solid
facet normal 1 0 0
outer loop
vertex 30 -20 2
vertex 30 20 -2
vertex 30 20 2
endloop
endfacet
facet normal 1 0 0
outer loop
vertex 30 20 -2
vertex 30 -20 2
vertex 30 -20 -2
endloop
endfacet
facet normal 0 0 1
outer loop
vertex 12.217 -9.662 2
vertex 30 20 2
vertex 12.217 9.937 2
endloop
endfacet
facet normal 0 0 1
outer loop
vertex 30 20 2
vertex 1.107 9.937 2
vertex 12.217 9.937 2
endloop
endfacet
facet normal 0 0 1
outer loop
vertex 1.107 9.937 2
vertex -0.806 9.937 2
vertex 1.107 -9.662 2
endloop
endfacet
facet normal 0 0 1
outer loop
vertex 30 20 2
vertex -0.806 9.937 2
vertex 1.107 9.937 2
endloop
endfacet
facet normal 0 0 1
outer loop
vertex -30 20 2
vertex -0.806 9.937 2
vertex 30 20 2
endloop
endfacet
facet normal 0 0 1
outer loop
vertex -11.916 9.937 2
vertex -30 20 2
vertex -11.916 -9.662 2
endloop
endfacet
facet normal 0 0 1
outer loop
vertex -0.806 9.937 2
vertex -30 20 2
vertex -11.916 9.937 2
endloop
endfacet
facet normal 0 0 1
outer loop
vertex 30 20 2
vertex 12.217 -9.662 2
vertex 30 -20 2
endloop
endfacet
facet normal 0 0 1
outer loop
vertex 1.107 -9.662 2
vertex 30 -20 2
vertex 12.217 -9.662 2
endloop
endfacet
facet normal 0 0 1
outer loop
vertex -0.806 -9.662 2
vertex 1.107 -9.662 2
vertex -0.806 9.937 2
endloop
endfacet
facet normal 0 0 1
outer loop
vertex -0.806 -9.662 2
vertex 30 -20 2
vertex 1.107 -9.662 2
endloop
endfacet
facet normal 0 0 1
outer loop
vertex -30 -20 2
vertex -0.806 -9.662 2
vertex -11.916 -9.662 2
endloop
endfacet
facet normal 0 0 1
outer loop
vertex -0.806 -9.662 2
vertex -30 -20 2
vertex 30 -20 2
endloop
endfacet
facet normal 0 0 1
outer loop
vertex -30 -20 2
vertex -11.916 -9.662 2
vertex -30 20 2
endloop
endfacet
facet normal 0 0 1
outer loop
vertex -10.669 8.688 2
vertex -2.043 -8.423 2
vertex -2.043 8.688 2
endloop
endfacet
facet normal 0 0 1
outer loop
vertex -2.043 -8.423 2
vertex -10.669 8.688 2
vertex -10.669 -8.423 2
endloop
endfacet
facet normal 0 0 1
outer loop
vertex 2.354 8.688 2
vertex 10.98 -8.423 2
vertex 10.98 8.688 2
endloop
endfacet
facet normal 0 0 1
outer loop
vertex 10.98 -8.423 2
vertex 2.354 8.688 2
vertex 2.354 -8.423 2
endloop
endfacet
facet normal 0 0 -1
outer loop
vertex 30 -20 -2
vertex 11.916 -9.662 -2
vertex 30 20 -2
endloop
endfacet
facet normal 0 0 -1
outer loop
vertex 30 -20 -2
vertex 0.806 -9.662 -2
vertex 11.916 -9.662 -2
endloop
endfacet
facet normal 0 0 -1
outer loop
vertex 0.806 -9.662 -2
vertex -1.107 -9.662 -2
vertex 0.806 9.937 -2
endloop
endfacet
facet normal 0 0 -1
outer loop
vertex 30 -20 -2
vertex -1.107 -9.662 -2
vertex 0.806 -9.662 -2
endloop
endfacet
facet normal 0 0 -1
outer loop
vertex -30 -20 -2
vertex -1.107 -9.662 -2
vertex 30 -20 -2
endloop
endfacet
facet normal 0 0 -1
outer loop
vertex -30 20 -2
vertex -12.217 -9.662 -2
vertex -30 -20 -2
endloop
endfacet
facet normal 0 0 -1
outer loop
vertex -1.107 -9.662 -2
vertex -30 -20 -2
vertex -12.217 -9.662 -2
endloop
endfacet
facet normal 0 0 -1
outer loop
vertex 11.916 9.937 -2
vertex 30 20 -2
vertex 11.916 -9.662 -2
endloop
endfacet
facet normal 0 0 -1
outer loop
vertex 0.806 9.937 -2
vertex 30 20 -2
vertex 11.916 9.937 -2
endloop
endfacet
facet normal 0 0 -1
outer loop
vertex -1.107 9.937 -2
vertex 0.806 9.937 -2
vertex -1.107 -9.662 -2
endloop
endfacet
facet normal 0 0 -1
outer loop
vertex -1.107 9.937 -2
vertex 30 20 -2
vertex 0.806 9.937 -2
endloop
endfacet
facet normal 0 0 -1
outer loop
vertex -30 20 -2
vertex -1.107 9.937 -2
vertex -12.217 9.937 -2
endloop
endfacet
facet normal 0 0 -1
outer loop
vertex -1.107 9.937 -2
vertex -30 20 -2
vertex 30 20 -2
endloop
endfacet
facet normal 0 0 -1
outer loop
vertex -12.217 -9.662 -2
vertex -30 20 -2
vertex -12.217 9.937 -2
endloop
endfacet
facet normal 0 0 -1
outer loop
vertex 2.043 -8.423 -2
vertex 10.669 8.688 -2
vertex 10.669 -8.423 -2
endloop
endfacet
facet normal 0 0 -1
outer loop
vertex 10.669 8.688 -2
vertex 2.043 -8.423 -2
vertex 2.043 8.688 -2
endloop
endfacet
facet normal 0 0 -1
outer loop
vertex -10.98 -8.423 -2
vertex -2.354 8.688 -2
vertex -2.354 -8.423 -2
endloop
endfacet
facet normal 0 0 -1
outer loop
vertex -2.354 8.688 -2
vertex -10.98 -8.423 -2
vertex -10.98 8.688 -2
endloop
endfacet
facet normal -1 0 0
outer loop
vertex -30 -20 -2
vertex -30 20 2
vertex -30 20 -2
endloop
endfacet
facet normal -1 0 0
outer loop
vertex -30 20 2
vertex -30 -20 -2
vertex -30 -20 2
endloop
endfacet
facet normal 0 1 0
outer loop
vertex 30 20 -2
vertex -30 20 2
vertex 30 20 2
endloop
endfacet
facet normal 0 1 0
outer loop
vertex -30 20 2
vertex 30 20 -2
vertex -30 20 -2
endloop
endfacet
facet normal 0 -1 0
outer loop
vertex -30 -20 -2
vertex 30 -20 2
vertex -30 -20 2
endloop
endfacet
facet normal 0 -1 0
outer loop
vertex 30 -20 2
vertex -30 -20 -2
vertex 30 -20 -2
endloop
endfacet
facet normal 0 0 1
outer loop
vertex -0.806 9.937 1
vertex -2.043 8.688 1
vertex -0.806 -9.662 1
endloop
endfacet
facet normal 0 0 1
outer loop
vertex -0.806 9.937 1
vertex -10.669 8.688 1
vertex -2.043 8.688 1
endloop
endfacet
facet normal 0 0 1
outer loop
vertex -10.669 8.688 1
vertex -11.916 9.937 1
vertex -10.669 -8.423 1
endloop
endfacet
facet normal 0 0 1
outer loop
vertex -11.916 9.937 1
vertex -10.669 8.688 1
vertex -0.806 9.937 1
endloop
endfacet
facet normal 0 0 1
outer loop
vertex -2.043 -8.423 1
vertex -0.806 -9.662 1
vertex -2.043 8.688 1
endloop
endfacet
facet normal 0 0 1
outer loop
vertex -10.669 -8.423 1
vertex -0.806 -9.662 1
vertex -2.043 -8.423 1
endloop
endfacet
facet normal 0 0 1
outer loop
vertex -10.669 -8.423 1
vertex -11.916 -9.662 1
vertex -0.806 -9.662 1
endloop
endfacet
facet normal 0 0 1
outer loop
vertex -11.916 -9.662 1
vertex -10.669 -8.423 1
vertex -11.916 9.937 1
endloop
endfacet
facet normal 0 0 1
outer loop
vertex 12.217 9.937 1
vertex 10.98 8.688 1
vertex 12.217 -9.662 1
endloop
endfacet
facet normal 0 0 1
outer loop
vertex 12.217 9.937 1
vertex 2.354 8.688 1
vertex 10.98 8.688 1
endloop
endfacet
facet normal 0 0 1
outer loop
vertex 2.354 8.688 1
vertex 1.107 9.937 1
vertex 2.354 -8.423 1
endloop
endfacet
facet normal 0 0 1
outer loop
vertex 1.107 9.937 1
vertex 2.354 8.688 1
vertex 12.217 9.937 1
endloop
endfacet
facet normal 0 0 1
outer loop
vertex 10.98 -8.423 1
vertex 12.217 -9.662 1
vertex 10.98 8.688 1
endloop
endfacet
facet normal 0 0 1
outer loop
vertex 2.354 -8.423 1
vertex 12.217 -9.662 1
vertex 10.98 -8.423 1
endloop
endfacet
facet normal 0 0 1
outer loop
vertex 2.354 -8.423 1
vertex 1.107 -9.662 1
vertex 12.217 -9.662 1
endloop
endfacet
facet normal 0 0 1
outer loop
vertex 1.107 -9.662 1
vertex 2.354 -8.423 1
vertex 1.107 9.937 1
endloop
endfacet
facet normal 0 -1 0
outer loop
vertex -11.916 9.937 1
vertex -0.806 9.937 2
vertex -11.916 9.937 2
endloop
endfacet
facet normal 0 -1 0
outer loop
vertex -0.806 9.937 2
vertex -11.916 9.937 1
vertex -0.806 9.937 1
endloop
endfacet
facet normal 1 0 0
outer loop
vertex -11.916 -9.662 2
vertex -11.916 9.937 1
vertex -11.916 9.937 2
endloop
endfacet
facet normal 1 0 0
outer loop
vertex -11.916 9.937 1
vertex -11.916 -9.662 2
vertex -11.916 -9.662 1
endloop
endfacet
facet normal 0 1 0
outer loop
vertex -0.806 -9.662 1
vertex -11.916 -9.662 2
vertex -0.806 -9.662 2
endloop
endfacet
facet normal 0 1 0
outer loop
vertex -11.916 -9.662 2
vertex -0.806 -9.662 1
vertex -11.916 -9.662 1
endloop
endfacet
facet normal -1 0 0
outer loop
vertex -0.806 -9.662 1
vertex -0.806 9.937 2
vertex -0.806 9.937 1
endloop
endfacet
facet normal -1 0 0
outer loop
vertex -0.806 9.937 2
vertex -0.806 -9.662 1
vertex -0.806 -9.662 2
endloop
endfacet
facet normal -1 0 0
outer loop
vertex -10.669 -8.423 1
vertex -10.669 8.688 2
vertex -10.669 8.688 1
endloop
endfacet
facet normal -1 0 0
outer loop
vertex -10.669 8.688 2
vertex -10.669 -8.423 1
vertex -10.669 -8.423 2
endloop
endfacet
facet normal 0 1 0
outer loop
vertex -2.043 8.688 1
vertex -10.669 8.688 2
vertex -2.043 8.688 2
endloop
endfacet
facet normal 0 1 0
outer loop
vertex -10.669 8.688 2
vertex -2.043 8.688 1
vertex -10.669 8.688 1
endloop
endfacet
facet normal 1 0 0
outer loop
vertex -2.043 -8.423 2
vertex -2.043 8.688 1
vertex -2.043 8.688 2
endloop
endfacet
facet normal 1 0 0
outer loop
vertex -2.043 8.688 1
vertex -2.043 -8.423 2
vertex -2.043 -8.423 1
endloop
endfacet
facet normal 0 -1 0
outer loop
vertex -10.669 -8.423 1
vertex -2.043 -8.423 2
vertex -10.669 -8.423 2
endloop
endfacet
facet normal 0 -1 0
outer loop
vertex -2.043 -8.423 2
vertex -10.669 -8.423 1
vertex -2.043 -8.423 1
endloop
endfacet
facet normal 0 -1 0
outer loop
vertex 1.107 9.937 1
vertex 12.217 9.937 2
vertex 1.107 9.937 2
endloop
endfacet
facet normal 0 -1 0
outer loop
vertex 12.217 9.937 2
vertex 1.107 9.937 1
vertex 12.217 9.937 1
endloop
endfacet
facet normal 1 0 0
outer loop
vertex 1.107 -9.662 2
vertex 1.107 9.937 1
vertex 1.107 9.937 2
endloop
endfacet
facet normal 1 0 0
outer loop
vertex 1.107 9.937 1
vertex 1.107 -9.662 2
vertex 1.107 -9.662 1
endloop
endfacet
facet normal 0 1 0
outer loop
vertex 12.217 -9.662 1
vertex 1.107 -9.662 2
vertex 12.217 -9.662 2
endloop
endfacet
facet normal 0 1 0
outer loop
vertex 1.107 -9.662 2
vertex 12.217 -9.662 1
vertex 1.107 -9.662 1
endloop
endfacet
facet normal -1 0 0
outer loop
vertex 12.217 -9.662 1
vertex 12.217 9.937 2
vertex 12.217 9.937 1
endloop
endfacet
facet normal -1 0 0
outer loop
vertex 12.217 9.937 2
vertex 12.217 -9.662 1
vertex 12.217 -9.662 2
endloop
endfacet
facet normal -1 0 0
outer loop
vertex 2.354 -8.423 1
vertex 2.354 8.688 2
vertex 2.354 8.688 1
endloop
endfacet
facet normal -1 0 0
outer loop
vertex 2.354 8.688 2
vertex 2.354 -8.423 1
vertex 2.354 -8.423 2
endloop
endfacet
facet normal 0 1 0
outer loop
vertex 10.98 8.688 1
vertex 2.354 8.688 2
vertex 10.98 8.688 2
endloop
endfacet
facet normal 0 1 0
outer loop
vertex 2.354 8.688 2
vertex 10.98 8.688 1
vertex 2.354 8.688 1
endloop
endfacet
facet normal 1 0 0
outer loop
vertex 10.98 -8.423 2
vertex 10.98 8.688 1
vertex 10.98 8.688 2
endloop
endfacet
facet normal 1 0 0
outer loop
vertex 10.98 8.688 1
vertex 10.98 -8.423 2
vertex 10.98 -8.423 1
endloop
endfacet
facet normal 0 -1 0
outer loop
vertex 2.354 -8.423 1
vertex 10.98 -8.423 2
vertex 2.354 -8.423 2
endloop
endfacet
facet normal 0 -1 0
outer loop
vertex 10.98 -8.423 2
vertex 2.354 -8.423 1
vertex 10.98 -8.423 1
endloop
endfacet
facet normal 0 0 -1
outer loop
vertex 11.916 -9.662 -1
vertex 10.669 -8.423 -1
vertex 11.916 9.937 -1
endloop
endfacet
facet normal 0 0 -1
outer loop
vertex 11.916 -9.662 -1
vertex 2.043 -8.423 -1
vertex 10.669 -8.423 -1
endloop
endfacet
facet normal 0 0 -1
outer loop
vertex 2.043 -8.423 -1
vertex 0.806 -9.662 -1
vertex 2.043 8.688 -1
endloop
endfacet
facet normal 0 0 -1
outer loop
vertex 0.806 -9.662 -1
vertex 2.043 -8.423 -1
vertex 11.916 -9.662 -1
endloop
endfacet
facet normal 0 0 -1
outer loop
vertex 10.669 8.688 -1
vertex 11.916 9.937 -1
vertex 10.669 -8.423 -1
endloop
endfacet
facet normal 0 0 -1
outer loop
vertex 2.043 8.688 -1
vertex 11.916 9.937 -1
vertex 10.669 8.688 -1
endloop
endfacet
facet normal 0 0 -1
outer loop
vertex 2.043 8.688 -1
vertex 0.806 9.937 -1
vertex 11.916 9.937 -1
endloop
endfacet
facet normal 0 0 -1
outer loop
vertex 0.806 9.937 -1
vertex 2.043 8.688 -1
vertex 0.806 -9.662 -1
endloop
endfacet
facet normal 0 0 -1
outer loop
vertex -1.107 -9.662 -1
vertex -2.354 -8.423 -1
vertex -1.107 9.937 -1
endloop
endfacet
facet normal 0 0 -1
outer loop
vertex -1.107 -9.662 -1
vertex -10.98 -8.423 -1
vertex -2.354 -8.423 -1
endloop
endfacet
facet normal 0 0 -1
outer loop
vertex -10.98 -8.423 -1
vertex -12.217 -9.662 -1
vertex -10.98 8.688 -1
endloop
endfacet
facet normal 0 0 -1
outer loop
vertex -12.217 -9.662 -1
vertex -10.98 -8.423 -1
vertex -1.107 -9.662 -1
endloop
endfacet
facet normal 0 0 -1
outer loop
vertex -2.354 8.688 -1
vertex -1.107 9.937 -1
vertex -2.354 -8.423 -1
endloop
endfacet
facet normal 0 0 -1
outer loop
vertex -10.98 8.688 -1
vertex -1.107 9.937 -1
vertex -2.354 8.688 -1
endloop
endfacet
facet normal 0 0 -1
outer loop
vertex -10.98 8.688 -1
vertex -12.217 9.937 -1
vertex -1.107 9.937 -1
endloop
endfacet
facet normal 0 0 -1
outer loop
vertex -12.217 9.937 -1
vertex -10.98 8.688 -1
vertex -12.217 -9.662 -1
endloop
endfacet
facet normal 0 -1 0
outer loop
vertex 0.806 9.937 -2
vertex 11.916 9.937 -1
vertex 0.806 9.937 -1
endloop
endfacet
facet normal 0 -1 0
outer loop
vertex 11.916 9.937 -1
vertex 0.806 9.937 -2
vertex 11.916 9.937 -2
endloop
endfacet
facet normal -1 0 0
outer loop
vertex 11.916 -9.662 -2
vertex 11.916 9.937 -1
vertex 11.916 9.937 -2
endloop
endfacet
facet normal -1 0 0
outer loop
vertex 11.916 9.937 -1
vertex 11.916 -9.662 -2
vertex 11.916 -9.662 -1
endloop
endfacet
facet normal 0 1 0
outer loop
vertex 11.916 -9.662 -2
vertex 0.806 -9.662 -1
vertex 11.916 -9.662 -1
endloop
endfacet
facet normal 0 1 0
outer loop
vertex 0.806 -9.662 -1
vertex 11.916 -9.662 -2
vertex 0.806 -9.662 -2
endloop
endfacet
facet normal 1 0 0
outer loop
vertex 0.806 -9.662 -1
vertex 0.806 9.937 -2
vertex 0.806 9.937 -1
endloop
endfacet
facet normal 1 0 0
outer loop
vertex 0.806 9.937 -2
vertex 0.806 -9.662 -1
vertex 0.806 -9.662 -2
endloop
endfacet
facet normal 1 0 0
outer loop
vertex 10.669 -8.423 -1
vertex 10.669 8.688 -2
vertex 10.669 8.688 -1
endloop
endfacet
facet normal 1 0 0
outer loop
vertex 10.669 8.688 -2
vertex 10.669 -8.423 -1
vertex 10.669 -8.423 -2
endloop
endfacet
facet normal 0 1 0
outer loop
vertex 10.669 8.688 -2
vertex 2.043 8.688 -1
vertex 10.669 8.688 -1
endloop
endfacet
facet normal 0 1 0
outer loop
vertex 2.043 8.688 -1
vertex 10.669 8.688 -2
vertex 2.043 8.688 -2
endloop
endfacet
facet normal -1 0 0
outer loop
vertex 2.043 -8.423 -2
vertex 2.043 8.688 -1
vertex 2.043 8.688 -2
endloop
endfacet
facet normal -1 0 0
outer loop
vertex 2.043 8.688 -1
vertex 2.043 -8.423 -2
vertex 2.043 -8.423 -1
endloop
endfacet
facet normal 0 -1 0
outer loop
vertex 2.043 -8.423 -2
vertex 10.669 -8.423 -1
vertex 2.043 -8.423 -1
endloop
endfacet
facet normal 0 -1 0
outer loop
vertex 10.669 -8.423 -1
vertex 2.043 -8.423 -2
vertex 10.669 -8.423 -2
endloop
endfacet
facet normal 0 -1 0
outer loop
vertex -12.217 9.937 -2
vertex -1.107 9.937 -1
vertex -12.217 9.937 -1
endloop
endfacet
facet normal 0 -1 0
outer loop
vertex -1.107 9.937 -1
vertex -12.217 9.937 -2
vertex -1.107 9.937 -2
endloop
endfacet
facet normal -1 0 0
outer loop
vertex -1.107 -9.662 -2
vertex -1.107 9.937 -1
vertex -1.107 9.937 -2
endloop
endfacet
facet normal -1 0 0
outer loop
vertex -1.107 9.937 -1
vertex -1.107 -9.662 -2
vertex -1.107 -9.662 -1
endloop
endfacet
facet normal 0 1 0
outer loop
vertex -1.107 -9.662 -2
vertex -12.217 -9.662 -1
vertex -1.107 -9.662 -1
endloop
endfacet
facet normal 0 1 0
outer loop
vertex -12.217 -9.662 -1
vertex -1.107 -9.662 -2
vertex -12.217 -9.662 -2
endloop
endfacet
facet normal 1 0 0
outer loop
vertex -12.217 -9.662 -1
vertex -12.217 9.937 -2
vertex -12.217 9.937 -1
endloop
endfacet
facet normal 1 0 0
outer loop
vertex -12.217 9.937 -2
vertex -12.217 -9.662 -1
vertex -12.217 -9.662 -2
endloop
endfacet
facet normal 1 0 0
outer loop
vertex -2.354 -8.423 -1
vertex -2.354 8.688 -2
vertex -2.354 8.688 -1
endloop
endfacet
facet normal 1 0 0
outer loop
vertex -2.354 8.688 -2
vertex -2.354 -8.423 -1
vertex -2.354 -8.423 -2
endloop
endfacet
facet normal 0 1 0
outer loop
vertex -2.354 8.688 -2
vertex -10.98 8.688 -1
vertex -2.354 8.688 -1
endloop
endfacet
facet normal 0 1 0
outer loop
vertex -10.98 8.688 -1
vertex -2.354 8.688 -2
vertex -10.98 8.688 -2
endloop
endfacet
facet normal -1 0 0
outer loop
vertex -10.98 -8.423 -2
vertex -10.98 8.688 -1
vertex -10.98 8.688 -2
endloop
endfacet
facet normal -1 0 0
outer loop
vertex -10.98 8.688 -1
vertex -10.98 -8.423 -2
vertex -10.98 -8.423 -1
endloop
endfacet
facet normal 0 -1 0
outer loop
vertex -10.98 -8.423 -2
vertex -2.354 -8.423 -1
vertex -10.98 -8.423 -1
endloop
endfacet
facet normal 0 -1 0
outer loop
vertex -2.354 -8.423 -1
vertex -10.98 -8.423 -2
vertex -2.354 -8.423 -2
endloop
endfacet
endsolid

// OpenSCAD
// file: BOSL2/std.scad
// Minimal BOSL2 compatibility shim for bundled gallery models.
// It implements only the helpers used by the imported OpenSCAD projects.

CENTER = [0, 0, 0];
BOTTOM = [0, 0, -1];
TOP = [0, 0, 1];
LEFT = [-1, 0, 0];
RIGHT = [1, 0, 0];
FRONT = [0, -1, 0];
BACK = [0, 1, 0];

module up(z=0) {
    translate([0, 0, z]) children();
}

module down(z=0) {
    translate([0, 0, -z]) children();
}

module attach(anchor=CENTER) {
    children();
}

module cuboid(size=[1, 1, 1], anchor=CENTER) {
    center = anchor == CENTER;
    translate(center ? [0, 0, 0] : [0, 0, size[2] / 2])
        cube(size, center=true);
    children();
}

module xcyl(h=1, r=1, anchor=CENTER) {
    center = anchor == CENTER;
    translate(center ? [0, 0, 0] : [h / 2, 0, 0])
        rotate([0, 90, 0])
            cylinder(h=h, r=r, center=true);
}
// main file
include <BOSL2/std.scad>

width = 60;
height = 40;
thickness = 4;

module model()
{
    difference() {
        cuboid([width, height, thickness], rounding=1);
        translate([0, 0, thickness/2-1])
            my_text("先攻");
        translate([0, 0, -thickness/2])
            mirror([1,0,0])
                my_text("後攻");
    }
}

module my_text(text)
{
    linear_extrude(1)
        text(text, size=16, font="ヒラギノ角ゴシック:style=W6", valign="center", halign="center");
}

model();
